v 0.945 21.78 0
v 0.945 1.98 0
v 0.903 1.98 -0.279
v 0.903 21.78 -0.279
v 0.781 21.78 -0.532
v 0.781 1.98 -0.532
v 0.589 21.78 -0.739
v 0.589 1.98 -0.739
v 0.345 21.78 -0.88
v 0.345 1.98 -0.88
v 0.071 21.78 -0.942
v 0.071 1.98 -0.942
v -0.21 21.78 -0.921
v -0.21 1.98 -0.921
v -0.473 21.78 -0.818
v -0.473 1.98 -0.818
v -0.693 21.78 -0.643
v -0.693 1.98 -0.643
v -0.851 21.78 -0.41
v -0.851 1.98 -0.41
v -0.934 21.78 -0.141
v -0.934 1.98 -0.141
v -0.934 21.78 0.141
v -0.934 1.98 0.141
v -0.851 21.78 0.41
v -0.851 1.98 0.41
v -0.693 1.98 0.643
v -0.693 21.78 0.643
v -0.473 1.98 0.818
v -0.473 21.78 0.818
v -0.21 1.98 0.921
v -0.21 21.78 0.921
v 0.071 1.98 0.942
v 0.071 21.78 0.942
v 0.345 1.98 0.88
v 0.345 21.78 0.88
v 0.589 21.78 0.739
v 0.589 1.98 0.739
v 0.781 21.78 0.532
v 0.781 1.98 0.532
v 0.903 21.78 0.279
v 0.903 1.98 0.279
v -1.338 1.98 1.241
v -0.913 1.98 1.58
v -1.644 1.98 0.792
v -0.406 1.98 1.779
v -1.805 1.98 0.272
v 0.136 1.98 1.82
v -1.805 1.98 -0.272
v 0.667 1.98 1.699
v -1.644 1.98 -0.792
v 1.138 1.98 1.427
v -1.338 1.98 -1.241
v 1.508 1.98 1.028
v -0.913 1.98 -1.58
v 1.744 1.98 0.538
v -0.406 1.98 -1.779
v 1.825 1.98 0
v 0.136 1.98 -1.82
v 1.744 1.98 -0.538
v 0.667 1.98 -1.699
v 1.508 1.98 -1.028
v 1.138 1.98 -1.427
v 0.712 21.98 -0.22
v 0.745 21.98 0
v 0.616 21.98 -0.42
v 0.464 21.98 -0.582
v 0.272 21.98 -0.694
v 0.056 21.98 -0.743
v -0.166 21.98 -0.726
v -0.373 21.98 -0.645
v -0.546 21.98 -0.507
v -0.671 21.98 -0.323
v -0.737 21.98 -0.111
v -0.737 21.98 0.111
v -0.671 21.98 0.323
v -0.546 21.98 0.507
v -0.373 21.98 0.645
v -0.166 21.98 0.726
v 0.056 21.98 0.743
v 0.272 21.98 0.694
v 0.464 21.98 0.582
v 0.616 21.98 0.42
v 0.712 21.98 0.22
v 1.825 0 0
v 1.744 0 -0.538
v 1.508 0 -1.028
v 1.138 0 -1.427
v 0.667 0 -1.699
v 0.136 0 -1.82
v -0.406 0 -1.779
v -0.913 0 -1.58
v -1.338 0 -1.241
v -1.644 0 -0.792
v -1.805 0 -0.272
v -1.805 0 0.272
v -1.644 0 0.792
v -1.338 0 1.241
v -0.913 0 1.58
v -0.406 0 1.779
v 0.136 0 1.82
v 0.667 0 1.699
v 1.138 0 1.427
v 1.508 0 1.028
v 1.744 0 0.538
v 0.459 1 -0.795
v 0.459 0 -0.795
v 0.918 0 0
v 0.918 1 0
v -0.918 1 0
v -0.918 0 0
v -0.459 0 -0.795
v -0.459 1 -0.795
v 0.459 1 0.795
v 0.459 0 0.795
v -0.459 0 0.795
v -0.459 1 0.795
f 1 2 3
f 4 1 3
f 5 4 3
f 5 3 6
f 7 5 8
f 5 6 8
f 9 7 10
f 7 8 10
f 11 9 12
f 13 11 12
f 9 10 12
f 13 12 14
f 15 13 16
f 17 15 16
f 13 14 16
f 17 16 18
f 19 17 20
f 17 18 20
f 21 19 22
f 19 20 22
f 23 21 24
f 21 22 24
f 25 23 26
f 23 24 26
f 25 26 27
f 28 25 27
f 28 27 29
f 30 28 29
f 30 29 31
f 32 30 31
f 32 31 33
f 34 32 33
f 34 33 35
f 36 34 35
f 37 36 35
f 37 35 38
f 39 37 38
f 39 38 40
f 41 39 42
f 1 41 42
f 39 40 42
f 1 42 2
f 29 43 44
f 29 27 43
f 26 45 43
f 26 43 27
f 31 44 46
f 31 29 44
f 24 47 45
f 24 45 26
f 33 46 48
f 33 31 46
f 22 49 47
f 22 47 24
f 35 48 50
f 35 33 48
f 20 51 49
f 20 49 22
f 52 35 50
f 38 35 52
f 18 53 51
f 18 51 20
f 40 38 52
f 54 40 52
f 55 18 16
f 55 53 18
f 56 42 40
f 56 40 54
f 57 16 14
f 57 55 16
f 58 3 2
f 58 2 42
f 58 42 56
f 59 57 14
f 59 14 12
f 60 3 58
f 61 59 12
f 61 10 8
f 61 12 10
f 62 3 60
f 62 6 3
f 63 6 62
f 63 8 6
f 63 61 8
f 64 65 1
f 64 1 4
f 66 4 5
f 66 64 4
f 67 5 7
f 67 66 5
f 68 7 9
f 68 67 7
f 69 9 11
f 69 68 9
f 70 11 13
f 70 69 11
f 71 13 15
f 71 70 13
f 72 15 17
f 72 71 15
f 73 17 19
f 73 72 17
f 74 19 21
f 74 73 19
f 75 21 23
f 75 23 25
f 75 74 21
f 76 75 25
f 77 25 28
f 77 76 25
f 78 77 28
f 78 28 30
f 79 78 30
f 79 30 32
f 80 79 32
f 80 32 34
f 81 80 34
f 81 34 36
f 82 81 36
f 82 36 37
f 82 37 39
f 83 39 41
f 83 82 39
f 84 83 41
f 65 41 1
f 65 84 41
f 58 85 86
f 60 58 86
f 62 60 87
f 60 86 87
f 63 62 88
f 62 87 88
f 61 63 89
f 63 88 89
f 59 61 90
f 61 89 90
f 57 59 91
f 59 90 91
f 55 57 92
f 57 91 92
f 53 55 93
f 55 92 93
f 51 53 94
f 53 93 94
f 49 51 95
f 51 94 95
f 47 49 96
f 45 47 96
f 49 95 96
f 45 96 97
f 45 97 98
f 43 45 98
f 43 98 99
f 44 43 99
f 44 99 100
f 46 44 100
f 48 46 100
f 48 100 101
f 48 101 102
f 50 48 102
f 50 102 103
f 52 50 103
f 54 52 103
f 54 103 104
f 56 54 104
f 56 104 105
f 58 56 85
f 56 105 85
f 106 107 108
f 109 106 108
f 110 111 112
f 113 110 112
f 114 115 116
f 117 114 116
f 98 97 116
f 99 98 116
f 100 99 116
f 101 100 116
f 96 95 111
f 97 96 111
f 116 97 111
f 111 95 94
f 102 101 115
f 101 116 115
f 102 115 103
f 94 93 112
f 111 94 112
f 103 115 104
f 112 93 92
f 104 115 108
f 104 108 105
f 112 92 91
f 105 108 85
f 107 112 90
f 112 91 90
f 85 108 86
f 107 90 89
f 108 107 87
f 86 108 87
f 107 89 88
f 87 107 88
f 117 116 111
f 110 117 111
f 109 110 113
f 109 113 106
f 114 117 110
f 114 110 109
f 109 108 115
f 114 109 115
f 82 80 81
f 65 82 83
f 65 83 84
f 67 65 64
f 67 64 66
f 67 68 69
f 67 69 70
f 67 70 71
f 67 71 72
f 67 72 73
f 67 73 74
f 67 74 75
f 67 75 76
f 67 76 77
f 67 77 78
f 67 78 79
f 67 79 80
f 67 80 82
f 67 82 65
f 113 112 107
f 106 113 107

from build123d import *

# Parameters (mm, degrees)
SKETCH1_R           = 1.825
BOSS_EXTRUDE1_DEPTH = 1.98
SKETCH2_R           = 0.945
BOSS_EXTRUDE2_DEPTH = 20
CUT_EXTRUDE1_DEPTH  = 1
CHAMFER1_SIZE       = 0.2


with BuildPart() as part:
    # Sketch1 → Boss-Extrude1 (new body)
    with BuildSketch(Plane(origin=(0, 0, 0), x_dir=(1, 0, 0), z_dir=(0, 1, 0))):
        Circle(SKETCH1_R)
    extrude(amount=BOSS_EXTRUDE1_DEPTH)

    # Sketch2 → Boss-Extrude2 (add)
    with BuildSketch(Plane(origin=(0, 1.98, 0), x_dir=(1, 0, 0), z_dir=(0, 1, 0))):
        Circle(SKETCH2_R)
    extrude(amount=BOSS_EXTRUDE2_DEPTH)

    # Sketch3 → Cut-Extrude1 (cut)
    with BuildSketch(Plane.XZ):
        Polygon((0.458993464, -0.795), (0.917986928, 0), (0.458993464, 0.795), (-0.458993464, 0.795), (-0.917986928, 0), (-0.458993464, -0.795), align=None)
    extrude(amount=-CUT_EXTRUDE1_DEPTH, mode=Mode.SUBTRACT)

    # Chamfer1
    chamfer1_edges = [part.edges().sort_by_distance(p)[0] for p in [
        (-0.945, 21.98, 0),
    ]]
    chamfer(chamfer1_edges, length=CHAMFER1_SIZE)


solid = part.part
